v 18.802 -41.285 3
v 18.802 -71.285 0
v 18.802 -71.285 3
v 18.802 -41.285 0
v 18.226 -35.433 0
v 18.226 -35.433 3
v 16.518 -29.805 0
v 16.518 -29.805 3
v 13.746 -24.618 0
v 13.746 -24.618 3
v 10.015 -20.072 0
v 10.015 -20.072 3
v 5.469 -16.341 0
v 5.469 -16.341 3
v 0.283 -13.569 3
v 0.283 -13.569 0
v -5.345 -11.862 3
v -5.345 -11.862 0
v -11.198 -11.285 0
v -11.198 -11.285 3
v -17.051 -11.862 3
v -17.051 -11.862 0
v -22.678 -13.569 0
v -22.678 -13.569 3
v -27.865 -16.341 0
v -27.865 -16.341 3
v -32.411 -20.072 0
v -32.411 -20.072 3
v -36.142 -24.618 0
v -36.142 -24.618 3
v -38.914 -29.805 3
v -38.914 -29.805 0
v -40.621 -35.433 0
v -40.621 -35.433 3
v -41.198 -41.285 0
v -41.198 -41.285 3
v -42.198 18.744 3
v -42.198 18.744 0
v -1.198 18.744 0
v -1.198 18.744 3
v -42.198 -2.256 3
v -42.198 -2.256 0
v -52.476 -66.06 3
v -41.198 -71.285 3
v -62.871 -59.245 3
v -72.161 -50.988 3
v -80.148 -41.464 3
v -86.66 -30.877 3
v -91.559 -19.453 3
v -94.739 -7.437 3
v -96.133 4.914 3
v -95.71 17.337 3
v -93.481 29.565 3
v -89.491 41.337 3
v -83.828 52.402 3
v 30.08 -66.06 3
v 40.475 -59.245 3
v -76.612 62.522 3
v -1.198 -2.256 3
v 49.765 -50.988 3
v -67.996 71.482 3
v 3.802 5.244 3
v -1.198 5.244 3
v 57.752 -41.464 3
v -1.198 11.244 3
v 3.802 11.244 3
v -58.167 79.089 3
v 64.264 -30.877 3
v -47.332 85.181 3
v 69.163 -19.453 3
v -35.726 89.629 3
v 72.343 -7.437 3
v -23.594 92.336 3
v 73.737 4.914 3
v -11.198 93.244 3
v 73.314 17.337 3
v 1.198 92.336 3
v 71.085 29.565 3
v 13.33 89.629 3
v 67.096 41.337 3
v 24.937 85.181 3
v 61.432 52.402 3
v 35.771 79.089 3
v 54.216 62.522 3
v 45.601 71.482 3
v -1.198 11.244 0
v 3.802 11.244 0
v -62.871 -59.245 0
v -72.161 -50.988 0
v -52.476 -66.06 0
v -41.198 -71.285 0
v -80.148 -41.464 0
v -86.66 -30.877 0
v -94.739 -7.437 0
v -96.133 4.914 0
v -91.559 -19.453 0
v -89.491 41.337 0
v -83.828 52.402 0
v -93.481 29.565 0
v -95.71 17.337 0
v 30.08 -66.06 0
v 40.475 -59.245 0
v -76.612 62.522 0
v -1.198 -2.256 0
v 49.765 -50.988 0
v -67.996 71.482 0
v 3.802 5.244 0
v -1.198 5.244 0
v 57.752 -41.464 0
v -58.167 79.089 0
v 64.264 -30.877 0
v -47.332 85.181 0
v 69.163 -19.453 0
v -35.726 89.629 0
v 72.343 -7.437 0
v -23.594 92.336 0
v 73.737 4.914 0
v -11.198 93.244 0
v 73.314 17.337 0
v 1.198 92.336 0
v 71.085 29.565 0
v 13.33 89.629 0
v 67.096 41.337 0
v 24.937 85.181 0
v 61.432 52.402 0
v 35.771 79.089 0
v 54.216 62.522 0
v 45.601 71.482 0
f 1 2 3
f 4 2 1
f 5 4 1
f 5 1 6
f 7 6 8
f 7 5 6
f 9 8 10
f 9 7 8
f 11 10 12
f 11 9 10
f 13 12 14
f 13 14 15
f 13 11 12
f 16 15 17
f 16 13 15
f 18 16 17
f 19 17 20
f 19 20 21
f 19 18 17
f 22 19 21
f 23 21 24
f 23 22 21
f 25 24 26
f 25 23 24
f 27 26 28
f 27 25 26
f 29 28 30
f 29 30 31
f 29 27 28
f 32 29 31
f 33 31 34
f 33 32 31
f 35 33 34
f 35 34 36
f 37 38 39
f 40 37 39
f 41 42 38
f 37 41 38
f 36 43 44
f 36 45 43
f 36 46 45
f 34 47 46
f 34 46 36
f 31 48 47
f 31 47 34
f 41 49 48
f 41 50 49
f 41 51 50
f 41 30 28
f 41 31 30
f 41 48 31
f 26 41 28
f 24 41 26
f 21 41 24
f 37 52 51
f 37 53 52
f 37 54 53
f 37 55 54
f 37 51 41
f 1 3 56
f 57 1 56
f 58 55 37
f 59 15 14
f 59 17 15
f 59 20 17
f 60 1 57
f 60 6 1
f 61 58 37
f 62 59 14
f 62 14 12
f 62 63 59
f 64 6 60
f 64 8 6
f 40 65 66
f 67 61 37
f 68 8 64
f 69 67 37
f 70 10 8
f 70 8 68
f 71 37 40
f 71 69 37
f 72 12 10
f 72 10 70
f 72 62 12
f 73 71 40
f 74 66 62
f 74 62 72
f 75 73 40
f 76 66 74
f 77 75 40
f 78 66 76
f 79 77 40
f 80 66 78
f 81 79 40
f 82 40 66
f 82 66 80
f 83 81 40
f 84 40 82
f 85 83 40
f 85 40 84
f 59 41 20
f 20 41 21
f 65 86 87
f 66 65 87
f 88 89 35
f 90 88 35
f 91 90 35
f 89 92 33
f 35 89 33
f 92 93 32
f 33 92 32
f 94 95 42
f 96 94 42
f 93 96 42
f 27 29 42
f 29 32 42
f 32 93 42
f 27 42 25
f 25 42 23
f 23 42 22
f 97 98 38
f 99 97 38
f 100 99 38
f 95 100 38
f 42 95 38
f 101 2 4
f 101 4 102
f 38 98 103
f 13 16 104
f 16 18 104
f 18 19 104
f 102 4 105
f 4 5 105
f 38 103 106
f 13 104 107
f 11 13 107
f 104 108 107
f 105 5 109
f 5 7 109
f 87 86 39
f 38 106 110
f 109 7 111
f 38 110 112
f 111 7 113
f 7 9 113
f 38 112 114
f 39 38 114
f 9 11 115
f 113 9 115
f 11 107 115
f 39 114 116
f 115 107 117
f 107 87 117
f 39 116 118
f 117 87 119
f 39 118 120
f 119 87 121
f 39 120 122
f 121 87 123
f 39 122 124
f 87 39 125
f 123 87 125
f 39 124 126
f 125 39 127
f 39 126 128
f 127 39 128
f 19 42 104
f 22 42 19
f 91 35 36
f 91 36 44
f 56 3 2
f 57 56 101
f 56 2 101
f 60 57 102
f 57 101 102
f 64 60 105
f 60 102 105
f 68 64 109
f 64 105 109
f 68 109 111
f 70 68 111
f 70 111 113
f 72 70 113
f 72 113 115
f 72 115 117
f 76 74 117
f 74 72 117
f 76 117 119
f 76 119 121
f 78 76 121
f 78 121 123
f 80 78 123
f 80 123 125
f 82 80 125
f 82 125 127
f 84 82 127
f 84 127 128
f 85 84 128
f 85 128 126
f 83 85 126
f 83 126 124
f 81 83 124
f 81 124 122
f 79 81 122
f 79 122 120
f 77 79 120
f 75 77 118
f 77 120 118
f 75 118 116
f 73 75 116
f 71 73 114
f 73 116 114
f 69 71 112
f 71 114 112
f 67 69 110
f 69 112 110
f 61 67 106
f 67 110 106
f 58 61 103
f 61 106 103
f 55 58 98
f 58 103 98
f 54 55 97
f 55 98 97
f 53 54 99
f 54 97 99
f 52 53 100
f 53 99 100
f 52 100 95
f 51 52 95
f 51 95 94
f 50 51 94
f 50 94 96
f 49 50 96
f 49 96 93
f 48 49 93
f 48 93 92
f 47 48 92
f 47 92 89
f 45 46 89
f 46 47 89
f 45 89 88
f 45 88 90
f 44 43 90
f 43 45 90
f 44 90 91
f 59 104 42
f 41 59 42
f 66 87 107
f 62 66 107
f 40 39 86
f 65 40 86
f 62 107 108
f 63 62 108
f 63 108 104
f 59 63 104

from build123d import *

# Parameters (mm, degrees)
ESQUISSE1_R              = 85
BOSS_EXTRU_1_DEPTH       = 3
ESQUISSE2_R              = 1
ENL_V_MAT_EXTRU_1_DEPTH  = 3
ENL_V_MAT_EXTRU_10_DEPTH = 3


with BuildPart() as part:
    # Esquisse1 → Boss.-Extru.1 (new body)
    with BuildSketch(Plane.XY):
        with Locations((-11.197924537, 8.24446622)):
            Circle(ESQUISSE1_R)
    extrude(amount=BOSS_EXTRU_1_DEPTH)

    # Esquisse2 → Enlèv. mat.-Extru.1 (cut)
    # profile 1 of 2: a face of its own
    with BuildSketch(Plane(origin=(0, 0, 0), x_dir=(-1, 0, 0), z_dir=(0, 0, -1))):
        Polygon((-3.802075463, 11.24446622), (-3.802075463, 5.24446622), (1.197924537, 5.24446622), (1.197924537, -2.25553378), (42.197924537, -2.25553378), (42.197924537, 18.74446622), (1.197924537, 18.74446622), (1.197924537, 11.24446622), align=None)
        with Locations((11.197924537, 8.24446622)):
            Circle(ESQUISSE2_R, mode=Mode.SUBTRACT)
    # profile 2 of 2: a face of its own
    with BuildSketch(Plane(origin=(0, 0, 0), x_dir=(-1, 0, 0), z_dir=(0, 0, -1))):
        with Locations((11.197924537, 8.24446622)):
            Circle(ESQUISSE2_R)
    extrude(amount=-ENL_V_MAT_EXTRU_1_DEPTH, mode=Mode.SUBTRACT)

    # Esquisse3 → Enlèv. mat.-Extru.10 (cut)
    with BuildSketch(Plane(origin=(0, 0, 0), x_dir=(-1, 0, 0), z_dir=(0, 0, -1))):
        with BuildLine():
            Line((-18.802075463, -71.285402383), (-18.802075463, -41.285402383))
            ThreePointArc((-18.802075463, -41.285402383), (11.197924537, -11.285402383), (41.197924537, -41.285402383))
            Line((41.197924537, -41.285402383), (41.197924537, -71.285402383))
            ThreePointArc((41.197924537, -71.285402383), (11.197924537, -76.75553378), (-18.802075463, -71.285402383))
        make_face()
    extrude(amount=-ENL_V_MAT_EXTRU_10_DEPTH, mode=Mode.SUBTRACT)


solid = part.part
